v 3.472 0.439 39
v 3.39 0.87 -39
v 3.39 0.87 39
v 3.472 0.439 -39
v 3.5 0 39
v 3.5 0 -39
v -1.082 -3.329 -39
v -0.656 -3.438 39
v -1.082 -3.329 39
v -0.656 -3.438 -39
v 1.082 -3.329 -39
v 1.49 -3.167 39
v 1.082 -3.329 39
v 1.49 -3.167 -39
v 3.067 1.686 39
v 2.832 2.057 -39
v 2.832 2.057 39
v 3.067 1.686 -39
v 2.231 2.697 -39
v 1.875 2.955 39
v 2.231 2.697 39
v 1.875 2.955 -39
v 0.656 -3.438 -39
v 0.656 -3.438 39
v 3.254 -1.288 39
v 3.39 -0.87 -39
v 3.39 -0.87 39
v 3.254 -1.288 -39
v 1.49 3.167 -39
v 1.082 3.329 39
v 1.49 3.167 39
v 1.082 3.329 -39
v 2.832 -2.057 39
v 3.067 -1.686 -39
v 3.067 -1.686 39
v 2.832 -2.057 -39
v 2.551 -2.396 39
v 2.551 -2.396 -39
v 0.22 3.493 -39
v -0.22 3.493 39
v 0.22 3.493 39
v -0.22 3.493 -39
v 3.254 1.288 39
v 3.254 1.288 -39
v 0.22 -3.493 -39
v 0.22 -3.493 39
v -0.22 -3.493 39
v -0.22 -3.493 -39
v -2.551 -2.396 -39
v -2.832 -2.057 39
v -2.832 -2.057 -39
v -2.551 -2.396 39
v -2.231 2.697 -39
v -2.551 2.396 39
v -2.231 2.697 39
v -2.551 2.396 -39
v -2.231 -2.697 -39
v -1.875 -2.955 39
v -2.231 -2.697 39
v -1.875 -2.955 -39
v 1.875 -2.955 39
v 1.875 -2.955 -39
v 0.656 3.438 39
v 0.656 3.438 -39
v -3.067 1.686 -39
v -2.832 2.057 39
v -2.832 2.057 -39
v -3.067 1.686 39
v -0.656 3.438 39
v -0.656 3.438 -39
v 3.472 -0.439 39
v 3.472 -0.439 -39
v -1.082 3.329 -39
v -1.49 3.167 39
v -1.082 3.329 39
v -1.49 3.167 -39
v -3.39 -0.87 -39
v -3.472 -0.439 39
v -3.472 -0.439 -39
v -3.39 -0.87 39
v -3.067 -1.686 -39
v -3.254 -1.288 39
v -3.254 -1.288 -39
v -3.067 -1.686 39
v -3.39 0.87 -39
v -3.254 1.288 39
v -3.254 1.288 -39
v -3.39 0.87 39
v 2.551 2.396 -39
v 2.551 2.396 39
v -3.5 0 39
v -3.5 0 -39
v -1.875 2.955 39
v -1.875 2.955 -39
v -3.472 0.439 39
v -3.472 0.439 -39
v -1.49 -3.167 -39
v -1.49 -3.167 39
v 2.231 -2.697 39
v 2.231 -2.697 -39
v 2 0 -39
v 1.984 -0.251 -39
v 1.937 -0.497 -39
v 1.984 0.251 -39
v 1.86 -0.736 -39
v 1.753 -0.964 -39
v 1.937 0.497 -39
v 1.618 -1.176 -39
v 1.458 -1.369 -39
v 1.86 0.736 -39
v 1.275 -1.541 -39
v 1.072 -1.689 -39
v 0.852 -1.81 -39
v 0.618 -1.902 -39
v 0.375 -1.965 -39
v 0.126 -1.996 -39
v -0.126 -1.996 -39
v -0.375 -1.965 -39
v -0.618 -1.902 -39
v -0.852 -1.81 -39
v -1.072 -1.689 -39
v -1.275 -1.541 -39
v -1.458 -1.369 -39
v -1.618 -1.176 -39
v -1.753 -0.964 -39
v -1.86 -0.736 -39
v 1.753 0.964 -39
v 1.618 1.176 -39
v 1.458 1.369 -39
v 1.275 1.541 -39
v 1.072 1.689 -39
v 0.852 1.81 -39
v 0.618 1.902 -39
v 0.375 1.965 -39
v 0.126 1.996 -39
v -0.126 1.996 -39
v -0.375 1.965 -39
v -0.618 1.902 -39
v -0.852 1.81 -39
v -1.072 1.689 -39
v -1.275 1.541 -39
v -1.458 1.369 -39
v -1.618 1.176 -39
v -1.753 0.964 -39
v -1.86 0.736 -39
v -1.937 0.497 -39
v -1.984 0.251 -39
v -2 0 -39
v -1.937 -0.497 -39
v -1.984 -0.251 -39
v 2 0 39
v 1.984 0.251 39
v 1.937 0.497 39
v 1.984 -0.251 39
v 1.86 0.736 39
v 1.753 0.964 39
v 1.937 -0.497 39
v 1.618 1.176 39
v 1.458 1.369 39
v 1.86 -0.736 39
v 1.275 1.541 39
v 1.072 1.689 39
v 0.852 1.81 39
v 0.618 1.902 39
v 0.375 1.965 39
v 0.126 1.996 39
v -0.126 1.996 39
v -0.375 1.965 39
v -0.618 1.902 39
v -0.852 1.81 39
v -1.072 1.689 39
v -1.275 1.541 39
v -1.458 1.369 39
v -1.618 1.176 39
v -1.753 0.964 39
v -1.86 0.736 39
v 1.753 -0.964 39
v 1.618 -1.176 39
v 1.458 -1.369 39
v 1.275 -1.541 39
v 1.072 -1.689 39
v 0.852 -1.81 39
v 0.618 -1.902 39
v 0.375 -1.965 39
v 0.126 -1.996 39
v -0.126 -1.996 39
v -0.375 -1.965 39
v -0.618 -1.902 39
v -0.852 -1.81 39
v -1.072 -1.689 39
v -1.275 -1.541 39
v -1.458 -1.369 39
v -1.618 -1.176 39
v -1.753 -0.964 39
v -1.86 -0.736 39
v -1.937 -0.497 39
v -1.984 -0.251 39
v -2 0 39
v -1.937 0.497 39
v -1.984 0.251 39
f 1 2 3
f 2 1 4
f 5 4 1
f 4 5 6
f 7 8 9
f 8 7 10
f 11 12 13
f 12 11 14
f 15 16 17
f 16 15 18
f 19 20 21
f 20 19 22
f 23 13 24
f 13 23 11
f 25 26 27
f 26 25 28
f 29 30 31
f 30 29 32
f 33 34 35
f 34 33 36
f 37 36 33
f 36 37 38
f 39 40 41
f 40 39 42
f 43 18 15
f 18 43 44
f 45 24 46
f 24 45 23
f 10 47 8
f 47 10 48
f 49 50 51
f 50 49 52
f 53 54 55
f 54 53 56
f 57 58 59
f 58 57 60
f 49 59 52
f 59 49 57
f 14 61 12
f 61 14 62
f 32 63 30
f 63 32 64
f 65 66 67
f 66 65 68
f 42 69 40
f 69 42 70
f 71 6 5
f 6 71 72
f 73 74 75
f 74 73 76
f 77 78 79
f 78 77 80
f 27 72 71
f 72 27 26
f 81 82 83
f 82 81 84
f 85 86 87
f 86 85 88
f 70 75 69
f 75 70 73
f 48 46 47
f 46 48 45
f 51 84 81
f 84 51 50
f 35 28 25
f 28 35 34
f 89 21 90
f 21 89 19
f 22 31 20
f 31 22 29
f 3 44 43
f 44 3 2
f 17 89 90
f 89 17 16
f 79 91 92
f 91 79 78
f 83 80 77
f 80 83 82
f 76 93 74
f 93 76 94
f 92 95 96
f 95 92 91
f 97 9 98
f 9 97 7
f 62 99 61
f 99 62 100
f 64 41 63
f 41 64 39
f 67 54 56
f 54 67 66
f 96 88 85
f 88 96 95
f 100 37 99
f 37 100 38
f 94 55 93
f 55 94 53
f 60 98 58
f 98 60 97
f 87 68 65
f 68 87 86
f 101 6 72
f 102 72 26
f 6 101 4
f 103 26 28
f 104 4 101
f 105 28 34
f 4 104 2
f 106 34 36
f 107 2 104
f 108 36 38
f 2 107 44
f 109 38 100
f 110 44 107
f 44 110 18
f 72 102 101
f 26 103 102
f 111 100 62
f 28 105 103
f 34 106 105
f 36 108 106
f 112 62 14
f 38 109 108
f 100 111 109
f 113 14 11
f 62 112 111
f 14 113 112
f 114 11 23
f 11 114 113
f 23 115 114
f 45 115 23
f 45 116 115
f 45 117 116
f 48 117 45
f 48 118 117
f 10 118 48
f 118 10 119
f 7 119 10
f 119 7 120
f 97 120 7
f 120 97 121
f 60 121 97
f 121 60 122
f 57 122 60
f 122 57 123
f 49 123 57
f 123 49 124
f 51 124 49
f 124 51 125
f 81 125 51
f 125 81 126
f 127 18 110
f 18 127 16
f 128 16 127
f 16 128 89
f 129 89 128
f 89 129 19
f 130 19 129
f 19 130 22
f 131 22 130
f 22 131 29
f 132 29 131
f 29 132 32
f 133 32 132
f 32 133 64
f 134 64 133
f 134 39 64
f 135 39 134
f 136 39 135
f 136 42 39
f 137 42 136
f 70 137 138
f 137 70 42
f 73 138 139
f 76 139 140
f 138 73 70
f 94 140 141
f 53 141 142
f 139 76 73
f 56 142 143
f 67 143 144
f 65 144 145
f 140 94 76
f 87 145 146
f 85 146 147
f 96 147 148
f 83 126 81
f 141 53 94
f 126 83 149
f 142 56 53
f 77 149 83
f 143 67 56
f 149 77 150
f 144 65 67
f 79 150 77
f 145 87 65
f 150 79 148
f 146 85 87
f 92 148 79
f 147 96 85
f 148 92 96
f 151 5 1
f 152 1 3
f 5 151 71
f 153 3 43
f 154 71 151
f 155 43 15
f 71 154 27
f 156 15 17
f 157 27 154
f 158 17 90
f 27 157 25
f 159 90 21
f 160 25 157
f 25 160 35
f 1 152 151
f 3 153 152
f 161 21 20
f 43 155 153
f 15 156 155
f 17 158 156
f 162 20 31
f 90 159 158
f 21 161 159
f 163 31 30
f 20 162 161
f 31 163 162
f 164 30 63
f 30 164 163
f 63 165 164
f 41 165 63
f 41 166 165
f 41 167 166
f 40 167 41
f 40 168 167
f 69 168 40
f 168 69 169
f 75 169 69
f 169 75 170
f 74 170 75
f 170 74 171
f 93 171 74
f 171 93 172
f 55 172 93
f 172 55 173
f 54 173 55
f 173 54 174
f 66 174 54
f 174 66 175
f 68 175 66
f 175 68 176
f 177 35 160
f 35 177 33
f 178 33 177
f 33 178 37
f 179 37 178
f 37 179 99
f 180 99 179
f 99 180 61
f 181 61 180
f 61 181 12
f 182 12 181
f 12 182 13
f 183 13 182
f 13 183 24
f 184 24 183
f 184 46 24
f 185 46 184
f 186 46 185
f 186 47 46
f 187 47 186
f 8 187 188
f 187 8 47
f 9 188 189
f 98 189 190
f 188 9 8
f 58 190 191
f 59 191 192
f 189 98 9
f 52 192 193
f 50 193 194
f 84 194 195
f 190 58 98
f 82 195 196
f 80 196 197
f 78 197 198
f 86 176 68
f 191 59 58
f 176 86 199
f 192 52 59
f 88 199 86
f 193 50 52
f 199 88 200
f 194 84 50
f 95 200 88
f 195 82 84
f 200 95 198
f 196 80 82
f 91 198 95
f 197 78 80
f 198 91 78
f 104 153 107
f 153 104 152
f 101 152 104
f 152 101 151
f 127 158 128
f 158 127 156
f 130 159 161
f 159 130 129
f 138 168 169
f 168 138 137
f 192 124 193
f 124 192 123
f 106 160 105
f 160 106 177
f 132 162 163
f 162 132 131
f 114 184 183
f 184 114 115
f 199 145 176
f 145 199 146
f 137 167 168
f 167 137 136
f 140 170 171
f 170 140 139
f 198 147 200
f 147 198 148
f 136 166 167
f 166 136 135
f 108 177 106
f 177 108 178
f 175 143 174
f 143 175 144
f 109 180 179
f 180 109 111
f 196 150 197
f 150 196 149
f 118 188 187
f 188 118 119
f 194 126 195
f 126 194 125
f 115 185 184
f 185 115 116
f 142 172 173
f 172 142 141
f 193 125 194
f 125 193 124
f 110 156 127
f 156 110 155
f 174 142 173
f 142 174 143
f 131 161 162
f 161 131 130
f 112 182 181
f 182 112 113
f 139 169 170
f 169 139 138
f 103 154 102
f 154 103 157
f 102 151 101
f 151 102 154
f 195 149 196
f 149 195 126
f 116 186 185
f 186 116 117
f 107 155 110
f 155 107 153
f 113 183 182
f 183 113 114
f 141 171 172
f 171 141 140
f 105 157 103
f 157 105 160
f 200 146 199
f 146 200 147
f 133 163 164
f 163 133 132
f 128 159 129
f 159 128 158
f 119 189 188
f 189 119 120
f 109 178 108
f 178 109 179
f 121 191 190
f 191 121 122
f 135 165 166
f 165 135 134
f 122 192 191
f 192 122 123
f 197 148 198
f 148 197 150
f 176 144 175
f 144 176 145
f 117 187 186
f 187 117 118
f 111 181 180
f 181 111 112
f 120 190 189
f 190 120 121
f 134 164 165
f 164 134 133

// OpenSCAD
$fn = 50;


difference() {
	union() {
		translate(v = [0, 0, -39.0000000000]) {
			cylinder(h = 78, r = 3.5000000000);
		}
	}
	union() {
		translate(v = [0, 0, -100.0000000000]) {
			cylinder(h = 200, r = 2.0000000000);
		}
	}
}
